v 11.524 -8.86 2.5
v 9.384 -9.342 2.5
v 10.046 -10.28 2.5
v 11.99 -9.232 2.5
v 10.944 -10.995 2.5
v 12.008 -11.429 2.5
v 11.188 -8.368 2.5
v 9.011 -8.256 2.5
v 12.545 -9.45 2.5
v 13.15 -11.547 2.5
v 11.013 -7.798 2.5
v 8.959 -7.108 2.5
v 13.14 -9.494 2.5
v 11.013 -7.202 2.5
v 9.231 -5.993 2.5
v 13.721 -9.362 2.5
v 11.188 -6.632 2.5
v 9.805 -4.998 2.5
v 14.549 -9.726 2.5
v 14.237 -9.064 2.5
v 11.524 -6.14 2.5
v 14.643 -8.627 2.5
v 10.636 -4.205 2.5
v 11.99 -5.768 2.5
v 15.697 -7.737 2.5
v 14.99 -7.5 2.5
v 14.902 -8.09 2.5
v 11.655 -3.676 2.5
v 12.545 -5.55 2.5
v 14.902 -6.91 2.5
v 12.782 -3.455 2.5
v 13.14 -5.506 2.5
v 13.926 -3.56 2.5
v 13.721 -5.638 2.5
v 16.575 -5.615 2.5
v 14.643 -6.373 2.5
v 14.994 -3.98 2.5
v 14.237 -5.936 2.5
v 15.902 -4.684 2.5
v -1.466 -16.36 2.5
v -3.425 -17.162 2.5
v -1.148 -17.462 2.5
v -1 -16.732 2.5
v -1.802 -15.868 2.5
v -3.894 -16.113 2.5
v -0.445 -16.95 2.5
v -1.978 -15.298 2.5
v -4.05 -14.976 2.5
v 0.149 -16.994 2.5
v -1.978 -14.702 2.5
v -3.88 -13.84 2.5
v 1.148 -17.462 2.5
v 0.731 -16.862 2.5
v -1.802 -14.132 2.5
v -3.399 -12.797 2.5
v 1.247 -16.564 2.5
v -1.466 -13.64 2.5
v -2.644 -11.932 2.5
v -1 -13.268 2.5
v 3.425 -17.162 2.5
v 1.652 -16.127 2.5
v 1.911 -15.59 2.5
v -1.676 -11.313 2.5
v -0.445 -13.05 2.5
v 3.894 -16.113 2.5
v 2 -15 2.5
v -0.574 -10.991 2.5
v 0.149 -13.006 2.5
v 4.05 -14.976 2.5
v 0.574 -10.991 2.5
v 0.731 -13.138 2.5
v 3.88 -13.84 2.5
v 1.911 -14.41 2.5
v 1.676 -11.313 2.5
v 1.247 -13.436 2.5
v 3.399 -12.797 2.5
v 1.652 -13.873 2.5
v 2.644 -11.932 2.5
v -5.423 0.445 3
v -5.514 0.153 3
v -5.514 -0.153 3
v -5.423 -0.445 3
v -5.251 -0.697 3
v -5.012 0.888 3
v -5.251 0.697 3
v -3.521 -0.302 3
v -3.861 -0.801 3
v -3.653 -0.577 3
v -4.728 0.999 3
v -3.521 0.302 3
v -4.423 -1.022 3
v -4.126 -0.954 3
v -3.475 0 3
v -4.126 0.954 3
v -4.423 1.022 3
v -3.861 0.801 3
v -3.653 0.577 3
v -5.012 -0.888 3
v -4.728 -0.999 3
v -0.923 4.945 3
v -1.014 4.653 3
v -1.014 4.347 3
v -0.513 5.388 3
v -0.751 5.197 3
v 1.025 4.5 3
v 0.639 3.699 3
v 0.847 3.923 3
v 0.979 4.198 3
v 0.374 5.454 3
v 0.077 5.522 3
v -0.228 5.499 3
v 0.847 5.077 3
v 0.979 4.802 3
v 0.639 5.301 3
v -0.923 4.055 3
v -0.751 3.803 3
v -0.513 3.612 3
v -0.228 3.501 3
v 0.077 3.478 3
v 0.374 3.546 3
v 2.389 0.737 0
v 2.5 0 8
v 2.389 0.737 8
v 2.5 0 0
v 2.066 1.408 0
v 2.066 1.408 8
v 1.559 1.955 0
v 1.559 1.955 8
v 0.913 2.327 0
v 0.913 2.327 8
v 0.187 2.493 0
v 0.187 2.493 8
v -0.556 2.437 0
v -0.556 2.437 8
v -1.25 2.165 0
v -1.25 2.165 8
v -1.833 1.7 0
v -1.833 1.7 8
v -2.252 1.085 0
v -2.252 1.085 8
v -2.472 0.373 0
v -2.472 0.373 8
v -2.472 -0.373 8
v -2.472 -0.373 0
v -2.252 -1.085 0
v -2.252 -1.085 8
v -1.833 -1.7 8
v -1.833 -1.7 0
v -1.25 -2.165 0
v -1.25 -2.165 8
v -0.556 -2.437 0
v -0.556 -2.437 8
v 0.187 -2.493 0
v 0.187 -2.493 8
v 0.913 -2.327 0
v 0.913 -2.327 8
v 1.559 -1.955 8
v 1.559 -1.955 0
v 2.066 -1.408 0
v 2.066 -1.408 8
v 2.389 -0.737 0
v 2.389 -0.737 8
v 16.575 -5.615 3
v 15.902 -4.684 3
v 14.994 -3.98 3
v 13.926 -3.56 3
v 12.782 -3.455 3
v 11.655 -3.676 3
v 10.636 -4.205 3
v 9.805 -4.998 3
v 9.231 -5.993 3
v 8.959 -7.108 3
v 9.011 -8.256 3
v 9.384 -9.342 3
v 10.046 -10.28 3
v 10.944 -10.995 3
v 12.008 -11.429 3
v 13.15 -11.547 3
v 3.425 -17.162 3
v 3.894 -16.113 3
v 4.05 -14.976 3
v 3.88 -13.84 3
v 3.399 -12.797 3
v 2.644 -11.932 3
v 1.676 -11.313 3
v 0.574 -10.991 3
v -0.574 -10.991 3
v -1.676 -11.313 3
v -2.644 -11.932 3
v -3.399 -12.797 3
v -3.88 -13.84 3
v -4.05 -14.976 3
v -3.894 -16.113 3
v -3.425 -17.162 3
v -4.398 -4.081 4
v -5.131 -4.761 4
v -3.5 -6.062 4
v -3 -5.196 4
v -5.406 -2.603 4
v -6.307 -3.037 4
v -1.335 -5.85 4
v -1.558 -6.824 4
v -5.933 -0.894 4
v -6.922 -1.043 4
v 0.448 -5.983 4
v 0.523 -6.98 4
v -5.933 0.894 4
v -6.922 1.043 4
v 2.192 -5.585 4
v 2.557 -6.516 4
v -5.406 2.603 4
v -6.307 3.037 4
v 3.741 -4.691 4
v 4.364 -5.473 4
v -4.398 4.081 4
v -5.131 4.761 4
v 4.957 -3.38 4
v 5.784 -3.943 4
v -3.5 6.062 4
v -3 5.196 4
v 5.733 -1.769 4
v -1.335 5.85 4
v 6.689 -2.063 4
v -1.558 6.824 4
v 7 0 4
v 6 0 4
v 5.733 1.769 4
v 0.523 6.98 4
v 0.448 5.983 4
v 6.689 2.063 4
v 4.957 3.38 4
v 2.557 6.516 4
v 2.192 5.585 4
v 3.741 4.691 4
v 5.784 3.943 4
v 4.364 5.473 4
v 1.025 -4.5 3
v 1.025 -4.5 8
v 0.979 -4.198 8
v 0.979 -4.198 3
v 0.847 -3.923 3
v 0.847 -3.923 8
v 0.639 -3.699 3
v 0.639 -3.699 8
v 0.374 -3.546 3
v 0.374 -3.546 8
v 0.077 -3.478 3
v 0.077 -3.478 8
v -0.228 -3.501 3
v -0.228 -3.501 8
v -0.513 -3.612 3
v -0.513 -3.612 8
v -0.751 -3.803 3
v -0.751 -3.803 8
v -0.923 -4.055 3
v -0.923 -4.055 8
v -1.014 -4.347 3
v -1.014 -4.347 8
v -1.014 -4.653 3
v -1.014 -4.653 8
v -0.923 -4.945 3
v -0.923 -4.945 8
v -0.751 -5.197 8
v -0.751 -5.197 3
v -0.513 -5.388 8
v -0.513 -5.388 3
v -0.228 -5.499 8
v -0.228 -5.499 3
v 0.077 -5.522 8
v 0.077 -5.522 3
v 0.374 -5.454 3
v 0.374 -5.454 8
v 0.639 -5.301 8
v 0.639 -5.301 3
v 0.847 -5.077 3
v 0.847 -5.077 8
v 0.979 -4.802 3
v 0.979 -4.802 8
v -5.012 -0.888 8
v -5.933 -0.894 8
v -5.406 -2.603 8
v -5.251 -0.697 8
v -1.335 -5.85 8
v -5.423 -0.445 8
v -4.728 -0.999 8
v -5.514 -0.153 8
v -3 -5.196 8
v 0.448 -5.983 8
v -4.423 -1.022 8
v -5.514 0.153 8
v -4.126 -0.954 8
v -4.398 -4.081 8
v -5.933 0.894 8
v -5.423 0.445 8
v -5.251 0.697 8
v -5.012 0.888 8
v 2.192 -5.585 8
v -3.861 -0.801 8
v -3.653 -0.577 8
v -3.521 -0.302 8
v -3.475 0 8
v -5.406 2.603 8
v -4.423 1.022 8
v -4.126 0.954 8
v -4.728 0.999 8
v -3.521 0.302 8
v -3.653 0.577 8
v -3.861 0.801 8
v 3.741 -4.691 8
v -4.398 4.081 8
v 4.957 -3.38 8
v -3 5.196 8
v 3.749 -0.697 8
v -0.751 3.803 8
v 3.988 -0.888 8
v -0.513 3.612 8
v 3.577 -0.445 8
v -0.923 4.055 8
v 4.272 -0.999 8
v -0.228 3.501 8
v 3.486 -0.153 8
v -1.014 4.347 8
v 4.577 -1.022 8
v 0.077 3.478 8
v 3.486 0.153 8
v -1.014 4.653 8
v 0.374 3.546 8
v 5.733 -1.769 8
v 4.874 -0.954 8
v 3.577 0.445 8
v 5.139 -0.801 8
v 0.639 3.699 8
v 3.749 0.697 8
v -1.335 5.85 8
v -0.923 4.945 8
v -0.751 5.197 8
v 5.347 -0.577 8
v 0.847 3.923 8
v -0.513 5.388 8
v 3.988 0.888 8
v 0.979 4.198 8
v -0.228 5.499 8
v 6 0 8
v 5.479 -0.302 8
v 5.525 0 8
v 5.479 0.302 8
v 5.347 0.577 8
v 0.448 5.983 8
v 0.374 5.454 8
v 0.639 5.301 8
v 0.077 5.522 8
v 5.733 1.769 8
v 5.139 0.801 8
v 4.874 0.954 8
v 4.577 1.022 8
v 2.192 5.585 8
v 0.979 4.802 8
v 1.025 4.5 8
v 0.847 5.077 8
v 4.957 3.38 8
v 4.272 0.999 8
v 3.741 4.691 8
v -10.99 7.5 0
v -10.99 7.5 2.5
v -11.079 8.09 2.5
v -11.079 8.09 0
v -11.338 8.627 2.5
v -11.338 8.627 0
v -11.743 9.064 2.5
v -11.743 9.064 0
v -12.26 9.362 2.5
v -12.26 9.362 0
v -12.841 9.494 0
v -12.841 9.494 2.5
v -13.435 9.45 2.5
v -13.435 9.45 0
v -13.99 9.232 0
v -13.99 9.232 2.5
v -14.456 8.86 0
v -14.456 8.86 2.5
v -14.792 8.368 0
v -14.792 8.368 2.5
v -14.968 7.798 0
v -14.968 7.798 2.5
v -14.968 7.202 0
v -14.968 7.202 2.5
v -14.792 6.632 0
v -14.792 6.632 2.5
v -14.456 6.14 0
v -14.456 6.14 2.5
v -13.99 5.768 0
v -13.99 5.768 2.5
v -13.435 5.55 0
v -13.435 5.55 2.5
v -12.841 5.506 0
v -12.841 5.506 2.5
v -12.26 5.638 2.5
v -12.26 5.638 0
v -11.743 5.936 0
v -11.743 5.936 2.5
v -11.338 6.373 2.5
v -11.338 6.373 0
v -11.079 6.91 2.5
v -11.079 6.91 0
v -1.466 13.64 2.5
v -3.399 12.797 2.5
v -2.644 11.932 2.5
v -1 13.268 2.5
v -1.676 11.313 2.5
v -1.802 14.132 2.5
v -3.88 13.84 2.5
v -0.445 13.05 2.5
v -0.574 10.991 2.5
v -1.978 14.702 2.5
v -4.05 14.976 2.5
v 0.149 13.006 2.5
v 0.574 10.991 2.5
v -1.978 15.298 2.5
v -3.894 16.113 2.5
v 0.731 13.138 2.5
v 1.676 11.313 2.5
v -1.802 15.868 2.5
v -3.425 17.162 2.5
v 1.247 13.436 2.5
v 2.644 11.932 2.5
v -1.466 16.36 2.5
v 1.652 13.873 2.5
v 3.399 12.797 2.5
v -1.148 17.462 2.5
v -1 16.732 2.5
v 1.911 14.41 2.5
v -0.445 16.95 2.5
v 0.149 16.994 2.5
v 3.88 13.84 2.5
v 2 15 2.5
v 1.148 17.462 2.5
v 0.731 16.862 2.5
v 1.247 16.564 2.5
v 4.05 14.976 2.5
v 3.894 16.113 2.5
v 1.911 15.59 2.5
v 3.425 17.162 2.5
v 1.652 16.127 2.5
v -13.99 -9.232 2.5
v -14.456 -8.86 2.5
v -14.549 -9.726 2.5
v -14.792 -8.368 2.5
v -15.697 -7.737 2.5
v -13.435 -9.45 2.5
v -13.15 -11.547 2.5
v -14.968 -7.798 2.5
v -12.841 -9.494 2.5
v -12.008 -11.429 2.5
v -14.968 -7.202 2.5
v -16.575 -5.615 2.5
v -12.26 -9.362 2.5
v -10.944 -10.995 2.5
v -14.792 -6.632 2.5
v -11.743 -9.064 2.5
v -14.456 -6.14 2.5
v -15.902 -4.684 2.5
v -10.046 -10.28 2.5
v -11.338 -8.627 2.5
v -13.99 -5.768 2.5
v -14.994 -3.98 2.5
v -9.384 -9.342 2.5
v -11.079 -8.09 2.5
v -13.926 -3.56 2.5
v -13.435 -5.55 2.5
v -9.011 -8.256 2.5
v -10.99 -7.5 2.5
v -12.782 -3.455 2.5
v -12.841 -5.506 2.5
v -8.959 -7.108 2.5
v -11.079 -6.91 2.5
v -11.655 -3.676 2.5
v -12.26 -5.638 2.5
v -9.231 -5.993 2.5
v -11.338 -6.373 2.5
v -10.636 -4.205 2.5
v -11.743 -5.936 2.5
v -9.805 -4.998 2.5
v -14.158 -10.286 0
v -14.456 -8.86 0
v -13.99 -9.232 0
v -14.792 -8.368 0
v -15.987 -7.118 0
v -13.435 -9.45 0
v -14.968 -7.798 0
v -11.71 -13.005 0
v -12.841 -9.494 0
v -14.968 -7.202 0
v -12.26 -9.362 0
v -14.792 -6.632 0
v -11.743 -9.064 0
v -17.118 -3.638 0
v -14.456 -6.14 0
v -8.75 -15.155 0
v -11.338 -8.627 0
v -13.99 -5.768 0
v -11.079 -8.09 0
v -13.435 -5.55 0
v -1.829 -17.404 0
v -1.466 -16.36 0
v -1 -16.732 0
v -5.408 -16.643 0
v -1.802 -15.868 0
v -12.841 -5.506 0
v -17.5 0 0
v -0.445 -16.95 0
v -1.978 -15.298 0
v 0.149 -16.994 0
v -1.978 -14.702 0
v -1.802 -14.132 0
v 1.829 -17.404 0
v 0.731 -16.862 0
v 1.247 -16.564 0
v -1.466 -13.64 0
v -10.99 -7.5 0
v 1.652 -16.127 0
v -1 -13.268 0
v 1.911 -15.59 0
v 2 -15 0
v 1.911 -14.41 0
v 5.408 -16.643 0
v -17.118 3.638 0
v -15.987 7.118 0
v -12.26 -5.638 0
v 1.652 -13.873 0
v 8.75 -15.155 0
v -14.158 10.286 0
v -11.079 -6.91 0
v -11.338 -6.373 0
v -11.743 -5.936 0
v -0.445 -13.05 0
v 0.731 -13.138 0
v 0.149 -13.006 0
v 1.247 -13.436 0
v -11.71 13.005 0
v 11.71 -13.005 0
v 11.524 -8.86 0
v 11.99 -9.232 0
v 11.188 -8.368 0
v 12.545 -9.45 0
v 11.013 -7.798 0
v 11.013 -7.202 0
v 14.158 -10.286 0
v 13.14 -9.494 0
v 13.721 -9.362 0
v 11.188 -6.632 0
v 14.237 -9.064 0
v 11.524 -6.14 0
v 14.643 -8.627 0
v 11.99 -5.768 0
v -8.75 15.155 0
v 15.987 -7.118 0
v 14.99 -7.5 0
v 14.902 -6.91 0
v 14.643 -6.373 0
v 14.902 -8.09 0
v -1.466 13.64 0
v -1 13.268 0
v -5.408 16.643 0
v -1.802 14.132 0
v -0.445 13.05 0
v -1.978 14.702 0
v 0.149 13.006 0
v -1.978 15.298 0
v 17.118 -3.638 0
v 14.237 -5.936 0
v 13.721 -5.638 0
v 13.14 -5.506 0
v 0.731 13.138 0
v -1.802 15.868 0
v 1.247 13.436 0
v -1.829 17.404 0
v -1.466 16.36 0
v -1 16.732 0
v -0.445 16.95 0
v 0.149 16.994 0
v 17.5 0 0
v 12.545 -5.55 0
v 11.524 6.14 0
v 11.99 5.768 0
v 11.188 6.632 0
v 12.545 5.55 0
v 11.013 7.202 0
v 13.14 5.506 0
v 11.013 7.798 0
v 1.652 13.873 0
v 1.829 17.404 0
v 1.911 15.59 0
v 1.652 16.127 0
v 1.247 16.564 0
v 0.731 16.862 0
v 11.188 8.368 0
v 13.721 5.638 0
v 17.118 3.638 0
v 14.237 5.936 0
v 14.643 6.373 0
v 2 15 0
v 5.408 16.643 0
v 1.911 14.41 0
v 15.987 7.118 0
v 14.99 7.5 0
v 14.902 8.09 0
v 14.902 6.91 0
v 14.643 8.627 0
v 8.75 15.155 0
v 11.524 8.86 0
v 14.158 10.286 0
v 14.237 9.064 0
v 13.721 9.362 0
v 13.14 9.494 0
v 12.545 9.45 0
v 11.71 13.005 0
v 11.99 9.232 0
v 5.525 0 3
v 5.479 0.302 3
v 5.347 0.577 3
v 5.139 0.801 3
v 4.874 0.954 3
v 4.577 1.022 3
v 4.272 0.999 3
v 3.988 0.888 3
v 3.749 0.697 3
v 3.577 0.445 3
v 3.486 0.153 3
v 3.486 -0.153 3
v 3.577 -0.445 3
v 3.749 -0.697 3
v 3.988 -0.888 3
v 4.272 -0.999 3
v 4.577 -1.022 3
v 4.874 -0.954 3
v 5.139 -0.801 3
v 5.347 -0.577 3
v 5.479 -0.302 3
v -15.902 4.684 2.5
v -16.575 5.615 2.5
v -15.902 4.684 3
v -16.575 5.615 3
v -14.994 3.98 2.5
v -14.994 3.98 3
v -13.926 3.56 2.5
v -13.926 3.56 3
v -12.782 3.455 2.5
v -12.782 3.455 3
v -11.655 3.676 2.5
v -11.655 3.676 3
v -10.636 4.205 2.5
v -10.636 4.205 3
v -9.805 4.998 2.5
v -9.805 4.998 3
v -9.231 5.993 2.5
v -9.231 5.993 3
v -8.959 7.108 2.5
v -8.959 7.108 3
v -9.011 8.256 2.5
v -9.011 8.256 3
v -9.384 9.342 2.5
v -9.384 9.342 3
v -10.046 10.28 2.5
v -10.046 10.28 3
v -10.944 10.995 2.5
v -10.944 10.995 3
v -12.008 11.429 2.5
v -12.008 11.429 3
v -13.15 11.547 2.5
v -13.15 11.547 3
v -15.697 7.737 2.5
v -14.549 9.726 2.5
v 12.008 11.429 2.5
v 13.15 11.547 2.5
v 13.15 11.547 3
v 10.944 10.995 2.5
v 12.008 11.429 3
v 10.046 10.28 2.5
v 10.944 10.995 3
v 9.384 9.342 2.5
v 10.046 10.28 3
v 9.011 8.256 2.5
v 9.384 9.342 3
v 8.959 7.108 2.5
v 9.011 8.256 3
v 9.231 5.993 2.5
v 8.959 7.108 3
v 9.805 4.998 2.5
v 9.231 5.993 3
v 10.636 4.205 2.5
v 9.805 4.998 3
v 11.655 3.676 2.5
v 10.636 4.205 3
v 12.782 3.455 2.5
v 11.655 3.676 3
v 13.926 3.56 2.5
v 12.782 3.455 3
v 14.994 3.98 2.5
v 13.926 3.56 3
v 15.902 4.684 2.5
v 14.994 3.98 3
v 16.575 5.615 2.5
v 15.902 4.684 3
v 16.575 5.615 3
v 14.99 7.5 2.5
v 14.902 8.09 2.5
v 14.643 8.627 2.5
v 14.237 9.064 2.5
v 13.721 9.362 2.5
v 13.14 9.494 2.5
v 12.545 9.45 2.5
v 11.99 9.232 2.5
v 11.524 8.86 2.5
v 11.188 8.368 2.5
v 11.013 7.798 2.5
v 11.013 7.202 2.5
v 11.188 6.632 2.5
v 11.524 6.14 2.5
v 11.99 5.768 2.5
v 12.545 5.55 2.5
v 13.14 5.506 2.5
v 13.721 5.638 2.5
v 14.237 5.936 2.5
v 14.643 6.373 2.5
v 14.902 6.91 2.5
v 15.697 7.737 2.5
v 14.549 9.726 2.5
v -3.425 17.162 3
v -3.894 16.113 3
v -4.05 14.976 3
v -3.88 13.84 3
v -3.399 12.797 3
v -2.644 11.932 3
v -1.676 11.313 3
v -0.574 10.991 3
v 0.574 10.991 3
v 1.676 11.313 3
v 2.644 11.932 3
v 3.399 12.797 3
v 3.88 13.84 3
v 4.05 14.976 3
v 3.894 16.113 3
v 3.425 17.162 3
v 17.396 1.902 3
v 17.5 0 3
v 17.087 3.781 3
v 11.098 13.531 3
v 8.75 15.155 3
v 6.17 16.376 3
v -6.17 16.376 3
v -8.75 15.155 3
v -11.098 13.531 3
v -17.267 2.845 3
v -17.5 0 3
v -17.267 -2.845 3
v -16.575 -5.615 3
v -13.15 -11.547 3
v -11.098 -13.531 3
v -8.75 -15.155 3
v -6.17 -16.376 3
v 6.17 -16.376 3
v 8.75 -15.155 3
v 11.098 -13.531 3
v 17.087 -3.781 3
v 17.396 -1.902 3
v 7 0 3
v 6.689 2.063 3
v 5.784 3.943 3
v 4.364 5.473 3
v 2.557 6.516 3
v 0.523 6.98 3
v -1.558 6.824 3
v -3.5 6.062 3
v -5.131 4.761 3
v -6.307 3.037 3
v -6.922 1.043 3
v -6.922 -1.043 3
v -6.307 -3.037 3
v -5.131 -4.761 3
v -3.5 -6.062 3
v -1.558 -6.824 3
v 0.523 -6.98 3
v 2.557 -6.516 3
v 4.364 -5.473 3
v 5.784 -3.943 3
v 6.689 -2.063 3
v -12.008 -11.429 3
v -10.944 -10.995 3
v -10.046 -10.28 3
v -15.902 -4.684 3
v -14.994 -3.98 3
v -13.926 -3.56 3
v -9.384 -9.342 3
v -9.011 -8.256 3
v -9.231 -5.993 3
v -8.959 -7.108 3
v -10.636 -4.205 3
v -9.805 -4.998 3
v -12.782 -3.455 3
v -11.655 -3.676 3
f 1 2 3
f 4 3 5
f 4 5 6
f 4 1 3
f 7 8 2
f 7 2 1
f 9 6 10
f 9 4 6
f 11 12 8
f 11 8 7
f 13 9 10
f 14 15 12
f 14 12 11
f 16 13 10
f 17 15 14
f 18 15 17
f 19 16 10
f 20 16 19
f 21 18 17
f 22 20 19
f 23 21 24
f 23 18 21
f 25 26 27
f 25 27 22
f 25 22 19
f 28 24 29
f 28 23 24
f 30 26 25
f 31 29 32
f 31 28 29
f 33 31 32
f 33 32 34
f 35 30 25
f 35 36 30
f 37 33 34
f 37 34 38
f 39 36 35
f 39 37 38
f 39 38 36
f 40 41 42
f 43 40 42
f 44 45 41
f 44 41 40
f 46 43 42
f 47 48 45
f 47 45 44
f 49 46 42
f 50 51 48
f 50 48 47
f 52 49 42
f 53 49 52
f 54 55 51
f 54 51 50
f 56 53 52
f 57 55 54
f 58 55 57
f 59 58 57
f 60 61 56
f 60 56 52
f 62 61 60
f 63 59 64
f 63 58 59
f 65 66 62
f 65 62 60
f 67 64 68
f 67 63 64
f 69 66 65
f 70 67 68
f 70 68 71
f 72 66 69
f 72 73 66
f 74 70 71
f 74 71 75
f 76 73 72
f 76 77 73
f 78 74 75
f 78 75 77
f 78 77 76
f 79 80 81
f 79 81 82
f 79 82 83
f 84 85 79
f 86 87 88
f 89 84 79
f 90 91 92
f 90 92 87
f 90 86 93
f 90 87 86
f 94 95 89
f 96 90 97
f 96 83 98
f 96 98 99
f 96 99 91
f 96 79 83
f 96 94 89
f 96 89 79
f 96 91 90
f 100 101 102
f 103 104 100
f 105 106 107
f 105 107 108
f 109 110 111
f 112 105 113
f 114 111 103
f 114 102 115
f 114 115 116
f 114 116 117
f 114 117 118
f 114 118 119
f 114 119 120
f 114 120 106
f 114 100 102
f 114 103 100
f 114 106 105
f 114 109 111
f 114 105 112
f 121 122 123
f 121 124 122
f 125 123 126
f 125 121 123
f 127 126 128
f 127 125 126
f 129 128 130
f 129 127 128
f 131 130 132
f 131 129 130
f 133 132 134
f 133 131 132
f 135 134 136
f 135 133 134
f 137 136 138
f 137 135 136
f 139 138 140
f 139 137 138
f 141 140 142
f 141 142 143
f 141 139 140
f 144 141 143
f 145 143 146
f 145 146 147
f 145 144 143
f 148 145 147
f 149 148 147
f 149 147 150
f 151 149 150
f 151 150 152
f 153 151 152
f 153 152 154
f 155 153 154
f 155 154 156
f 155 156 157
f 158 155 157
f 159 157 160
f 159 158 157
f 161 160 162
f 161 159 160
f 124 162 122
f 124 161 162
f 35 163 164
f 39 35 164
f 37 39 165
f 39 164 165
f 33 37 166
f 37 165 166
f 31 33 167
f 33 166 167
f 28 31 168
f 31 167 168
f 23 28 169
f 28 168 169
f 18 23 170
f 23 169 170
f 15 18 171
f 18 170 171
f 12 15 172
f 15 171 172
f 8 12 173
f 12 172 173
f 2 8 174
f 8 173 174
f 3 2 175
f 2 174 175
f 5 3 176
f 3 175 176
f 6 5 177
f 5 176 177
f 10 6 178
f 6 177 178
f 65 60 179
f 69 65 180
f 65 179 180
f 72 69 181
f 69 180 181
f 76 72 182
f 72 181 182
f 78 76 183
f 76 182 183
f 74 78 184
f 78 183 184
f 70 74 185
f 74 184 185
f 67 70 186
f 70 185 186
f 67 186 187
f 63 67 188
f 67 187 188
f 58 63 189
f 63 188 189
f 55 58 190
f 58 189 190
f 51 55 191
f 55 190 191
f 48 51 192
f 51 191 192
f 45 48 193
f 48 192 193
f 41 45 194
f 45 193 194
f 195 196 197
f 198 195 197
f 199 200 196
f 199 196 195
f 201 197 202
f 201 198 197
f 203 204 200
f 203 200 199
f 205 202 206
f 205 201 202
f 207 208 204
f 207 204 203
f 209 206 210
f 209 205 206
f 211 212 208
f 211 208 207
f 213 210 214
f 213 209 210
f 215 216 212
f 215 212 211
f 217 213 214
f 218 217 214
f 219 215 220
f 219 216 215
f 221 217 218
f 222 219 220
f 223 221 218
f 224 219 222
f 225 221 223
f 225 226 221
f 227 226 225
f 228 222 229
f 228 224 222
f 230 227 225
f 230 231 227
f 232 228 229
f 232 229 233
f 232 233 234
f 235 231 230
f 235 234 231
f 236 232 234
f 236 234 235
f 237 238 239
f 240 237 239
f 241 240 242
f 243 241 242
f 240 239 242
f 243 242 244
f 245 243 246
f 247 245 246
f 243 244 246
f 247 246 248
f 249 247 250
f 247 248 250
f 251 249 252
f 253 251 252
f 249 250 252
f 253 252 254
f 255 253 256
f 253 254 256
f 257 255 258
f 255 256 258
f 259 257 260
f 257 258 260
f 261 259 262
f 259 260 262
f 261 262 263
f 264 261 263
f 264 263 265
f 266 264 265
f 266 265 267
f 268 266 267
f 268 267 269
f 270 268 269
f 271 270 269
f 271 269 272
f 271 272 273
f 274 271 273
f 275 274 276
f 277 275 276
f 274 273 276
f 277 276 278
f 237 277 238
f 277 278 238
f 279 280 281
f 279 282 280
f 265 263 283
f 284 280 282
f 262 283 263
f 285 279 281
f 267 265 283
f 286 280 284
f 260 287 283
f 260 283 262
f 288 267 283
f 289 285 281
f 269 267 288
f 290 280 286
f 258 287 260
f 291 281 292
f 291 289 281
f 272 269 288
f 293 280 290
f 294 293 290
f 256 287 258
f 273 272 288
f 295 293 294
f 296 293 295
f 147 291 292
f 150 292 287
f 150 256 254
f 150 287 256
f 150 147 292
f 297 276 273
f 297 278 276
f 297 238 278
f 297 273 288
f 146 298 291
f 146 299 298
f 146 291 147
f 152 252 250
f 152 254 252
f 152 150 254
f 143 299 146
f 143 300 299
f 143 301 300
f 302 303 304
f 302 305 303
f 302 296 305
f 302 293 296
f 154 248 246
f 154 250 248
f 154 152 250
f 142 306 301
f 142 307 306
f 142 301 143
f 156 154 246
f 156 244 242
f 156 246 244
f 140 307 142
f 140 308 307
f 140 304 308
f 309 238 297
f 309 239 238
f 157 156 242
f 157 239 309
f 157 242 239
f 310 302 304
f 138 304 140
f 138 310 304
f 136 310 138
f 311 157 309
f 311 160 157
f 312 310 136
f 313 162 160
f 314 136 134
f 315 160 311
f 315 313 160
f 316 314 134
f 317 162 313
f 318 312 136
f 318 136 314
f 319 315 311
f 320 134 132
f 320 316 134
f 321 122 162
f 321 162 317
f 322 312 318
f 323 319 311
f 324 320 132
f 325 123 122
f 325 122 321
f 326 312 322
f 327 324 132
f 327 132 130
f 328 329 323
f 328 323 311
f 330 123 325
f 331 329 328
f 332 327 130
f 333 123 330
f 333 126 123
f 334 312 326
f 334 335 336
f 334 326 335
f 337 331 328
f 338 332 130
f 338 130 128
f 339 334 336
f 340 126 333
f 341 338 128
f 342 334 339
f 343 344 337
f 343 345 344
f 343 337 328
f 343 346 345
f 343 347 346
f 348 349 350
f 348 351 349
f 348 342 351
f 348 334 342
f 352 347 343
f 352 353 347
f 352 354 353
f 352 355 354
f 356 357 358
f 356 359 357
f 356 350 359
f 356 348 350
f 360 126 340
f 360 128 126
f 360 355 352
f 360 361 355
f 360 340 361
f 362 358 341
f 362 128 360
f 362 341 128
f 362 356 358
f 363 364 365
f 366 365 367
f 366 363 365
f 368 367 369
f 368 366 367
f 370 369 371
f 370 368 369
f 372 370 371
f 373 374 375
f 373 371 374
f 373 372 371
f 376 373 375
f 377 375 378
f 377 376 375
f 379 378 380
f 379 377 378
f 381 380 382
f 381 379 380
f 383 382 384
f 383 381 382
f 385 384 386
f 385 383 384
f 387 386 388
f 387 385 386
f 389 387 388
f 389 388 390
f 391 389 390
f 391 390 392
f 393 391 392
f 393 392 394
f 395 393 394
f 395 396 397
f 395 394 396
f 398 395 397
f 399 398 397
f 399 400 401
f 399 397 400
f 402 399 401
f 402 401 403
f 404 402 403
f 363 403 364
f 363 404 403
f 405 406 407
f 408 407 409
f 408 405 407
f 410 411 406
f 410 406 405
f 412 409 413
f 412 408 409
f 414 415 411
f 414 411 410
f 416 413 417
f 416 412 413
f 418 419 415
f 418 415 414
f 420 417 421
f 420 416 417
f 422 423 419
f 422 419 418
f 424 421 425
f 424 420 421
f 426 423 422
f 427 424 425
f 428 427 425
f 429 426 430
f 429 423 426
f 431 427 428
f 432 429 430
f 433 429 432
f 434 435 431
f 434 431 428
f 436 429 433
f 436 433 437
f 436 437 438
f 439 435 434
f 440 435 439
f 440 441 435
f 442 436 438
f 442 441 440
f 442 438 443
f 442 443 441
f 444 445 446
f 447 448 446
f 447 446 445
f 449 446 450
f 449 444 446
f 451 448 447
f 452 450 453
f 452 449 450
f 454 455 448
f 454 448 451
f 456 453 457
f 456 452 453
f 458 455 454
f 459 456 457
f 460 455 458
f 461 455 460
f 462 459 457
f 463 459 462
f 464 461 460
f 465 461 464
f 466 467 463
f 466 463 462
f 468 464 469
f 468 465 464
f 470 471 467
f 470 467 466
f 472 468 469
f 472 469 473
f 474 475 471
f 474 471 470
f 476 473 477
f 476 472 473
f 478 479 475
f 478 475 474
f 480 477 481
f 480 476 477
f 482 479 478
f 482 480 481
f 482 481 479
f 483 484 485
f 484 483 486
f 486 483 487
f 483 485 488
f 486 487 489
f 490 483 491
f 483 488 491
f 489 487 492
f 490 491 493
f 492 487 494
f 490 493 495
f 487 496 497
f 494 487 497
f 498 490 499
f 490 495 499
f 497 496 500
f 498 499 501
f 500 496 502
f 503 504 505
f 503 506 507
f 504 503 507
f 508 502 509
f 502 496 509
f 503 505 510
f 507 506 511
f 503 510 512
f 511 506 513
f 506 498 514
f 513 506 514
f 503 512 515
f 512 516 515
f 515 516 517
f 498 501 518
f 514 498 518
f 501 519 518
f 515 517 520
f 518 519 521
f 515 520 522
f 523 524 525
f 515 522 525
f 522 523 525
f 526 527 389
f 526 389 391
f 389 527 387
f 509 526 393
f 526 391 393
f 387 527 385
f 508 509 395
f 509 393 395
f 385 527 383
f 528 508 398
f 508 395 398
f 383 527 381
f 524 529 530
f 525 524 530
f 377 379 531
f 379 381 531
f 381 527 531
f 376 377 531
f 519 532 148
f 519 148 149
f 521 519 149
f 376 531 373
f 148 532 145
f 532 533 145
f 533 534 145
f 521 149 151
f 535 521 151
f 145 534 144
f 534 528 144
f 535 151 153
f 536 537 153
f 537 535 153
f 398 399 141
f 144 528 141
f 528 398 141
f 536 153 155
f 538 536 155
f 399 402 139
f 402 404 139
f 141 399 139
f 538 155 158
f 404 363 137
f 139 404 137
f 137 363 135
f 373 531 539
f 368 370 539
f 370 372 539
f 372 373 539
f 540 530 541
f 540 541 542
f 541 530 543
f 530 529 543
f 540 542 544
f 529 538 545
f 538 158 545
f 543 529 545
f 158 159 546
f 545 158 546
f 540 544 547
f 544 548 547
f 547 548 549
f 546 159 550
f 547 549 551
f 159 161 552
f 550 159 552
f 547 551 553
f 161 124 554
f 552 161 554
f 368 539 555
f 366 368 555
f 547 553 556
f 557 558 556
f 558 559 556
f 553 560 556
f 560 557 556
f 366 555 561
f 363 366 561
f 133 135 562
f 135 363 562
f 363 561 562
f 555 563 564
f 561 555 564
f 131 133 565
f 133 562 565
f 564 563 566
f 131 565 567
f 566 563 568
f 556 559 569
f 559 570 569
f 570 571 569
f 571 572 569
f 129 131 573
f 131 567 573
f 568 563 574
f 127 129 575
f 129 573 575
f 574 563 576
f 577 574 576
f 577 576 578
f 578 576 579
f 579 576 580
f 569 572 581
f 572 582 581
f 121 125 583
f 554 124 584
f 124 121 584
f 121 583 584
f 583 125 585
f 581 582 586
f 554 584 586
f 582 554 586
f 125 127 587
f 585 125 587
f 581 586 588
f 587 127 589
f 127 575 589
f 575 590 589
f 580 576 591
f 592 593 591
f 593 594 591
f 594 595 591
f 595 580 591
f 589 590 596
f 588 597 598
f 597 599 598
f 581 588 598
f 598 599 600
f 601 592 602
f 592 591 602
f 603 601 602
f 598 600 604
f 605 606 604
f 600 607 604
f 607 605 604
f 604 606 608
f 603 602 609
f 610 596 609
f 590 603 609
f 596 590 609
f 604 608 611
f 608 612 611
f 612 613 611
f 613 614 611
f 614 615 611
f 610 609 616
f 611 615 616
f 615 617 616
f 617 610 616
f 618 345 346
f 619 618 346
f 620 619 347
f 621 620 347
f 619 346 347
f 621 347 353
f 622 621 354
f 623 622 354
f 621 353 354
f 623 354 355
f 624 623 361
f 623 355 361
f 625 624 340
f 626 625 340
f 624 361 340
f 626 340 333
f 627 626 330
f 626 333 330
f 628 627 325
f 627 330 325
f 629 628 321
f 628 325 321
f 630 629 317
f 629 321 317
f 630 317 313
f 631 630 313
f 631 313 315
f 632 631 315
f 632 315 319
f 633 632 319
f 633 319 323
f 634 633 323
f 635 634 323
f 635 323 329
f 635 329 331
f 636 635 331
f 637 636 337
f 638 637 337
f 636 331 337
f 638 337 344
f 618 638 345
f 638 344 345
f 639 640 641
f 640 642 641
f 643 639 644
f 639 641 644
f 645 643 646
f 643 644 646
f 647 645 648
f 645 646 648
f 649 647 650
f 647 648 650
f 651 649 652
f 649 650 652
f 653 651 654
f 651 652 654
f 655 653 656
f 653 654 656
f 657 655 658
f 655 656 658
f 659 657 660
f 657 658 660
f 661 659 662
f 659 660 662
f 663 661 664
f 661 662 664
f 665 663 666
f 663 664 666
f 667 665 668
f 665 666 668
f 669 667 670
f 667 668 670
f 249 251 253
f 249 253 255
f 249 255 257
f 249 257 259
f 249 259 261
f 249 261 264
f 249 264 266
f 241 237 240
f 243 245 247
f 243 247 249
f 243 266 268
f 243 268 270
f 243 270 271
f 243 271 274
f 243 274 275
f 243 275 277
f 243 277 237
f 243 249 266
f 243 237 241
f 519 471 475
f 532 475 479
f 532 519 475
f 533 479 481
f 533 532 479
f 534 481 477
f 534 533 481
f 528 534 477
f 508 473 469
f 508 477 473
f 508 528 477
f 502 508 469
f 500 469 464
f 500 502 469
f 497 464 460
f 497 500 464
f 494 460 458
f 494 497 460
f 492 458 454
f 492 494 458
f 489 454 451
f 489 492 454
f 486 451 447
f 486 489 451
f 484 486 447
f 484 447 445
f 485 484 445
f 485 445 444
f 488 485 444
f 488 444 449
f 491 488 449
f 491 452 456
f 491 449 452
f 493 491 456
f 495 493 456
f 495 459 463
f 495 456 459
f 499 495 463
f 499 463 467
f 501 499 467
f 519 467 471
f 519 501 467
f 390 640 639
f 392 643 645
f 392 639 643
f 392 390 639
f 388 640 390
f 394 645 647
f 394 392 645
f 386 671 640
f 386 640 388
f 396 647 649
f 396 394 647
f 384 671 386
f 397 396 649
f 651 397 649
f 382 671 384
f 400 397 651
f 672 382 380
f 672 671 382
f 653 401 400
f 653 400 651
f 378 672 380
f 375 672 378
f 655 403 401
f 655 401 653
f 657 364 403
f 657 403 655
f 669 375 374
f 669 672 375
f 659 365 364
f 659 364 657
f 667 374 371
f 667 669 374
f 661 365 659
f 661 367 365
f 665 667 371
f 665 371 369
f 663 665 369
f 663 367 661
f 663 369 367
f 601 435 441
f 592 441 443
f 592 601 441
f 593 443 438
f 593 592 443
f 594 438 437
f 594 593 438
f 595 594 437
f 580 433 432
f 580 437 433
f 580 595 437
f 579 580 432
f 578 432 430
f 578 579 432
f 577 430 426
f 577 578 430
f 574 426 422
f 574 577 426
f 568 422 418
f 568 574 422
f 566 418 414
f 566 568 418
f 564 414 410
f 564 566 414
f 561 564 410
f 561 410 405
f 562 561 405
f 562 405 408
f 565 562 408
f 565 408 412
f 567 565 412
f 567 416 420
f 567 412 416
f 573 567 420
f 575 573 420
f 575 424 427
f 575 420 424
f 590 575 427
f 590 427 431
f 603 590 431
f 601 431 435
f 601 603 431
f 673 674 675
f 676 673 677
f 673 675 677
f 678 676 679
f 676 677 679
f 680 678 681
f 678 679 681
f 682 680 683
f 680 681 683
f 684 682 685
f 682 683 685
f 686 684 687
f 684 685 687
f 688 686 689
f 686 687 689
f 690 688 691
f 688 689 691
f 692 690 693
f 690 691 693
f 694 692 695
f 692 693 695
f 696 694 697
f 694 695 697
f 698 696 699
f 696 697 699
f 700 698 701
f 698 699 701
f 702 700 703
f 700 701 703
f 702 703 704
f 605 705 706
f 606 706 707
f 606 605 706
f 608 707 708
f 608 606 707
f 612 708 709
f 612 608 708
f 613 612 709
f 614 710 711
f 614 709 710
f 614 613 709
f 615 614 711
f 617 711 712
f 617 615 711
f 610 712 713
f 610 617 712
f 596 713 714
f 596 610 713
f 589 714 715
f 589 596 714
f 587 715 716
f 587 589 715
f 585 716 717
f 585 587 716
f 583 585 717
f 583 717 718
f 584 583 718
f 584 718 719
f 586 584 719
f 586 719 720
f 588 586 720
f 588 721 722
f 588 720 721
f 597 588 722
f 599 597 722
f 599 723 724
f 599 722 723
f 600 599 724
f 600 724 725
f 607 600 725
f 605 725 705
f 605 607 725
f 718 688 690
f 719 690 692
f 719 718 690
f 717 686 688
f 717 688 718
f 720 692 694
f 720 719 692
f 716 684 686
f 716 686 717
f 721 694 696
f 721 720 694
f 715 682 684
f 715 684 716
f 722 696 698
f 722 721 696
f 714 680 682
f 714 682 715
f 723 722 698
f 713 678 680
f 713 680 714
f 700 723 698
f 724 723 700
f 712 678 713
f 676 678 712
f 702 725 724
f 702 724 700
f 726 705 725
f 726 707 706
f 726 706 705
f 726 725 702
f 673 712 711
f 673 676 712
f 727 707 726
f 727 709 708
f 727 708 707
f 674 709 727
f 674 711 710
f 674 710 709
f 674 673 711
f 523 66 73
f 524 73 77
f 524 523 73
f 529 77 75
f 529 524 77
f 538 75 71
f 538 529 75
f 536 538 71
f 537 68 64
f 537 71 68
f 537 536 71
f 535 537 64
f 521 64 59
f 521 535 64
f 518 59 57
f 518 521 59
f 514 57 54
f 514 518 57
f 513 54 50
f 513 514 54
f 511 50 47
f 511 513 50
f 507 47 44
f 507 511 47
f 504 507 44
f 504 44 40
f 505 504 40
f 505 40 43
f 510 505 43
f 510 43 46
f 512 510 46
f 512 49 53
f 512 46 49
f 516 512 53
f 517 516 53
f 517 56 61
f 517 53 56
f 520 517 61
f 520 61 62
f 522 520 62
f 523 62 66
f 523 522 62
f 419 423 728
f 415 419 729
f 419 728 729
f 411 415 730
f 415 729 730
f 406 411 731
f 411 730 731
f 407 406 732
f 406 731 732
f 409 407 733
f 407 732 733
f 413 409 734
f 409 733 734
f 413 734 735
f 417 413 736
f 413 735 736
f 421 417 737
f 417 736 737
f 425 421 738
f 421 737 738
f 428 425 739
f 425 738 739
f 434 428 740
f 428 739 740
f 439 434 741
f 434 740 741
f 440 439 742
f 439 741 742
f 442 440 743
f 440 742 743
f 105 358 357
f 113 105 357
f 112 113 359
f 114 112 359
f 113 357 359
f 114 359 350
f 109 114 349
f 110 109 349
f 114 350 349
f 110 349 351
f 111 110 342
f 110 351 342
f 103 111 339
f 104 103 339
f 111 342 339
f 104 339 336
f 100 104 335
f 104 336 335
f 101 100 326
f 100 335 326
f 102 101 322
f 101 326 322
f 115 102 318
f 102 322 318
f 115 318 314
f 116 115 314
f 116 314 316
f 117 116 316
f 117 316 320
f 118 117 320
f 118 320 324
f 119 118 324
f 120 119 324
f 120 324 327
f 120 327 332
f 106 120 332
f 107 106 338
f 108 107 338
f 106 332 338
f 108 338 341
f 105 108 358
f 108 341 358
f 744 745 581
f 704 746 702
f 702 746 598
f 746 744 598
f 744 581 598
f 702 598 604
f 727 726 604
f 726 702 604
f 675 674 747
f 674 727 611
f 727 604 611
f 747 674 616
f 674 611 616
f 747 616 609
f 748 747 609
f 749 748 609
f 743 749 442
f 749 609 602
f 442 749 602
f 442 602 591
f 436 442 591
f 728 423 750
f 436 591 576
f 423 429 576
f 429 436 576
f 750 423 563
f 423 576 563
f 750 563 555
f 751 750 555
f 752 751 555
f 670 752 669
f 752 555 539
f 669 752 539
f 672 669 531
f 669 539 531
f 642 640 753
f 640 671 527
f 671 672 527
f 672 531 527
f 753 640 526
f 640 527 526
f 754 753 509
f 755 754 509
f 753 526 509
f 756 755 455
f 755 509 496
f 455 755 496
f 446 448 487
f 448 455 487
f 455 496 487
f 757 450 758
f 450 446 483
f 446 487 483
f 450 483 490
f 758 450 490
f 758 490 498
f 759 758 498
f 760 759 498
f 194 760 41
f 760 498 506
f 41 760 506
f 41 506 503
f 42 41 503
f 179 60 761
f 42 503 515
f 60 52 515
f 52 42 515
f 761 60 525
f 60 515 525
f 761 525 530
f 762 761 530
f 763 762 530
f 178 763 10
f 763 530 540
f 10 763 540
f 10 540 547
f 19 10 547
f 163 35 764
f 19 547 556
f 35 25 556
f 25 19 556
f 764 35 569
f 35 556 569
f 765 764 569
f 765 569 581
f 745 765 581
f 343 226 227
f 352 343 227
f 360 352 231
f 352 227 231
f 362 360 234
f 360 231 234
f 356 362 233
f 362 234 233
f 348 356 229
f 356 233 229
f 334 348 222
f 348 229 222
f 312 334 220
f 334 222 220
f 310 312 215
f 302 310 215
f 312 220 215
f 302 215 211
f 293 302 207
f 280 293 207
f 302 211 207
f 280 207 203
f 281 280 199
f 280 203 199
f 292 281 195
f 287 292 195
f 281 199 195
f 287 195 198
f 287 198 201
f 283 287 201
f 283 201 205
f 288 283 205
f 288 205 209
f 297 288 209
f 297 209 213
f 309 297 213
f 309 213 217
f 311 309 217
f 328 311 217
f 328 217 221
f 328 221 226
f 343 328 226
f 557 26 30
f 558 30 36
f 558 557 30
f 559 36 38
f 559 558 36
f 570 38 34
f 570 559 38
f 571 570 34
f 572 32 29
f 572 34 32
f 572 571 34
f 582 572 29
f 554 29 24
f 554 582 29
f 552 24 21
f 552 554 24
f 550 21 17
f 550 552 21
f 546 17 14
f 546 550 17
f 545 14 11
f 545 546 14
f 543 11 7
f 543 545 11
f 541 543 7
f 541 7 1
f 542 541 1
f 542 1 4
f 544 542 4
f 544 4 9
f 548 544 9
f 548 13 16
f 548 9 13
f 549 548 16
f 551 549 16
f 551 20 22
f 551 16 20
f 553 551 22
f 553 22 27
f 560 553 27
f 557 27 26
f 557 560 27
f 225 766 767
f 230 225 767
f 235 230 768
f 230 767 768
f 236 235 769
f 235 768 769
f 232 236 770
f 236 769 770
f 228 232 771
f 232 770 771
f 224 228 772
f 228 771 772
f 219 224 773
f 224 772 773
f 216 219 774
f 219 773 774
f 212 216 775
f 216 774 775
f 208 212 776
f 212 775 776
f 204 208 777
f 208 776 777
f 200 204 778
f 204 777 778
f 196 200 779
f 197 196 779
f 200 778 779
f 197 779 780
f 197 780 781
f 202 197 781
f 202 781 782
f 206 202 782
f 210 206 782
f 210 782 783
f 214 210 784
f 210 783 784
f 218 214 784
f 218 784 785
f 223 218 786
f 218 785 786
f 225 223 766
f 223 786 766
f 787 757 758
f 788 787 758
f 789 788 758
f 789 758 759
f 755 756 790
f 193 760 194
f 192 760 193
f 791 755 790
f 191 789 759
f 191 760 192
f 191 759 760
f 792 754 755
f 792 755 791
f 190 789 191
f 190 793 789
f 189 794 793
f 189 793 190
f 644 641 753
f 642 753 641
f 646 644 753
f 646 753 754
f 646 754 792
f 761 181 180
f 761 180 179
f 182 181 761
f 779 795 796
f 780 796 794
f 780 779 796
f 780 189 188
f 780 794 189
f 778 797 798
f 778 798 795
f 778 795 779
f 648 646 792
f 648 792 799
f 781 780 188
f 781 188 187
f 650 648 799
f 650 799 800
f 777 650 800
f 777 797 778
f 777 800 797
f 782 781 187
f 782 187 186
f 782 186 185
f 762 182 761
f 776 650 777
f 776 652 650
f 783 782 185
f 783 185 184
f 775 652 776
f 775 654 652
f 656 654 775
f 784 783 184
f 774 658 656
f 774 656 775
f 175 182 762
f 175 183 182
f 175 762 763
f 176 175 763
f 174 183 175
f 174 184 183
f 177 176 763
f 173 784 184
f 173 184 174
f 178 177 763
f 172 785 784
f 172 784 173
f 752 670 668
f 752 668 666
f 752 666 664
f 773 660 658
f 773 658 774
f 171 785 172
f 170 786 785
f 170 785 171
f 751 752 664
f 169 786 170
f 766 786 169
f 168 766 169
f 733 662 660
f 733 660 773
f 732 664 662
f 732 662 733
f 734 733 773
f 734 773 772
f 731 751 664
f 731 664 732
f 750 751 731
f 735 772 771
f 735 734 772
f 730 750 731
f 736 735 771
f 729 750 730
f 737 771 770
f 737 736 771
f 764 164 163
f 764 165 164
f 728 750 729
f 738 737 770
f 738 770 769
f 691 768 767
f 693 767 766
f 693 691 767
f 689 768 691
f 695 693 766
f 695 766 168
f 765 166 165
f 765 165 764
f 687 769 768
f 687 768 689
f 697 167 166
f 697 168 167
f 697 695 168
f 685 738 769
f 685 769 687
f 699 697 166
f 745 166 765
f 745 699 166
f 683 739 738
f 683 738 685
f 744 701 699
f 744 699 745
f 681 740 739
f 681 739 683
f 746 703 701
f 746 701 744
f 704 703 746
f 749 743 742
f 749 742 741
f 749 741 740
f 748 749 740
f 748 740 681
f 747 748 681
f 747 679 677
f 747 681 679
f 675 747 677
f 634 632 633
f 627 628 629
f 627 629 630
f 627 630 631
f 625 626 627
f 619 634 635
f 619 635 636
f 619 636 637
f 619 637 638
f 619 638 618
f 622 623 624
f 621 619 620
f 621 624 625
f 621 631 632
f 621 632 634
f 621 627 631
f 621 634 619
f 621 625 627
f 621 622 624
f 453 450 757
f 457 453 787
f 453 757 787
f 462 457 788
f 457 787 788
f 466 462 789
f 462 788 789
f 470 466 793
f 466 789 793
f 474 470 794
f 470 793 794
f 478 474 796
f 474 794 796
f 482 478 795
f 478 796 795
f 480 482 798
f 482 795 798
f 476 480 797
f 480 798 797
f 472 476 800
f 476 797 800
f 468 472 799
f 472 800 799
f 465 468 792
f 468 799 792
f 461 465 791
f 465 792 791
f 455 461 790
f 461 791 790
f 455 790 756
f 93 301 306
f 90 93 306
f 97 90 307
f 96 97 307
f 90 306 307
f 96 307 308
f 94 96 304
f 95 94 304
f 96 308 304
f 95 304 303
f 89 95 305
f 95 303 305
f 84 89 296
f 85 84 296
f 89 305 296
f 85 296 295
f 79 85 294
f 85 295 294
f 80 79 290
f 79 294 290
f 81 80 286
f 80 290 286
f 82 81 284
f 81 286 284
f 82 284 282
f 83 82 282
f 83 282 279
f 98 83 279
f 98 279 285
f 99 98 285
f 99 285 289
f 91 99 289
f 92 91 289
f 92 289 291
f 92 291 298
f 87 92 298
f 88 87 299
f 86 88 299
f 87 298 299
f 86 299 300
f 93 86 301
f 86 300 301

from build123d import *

# Parameters (mm, degrees)
SKETCH_1_R          = 17.5
SKETCH_1_R_2        = 2.5
SKETCH_1_R_3        = 2
EXTRUDE_1_DEPTH     = 3
SKETCH_2_R          = 6
SKETCH_2_R_2        = 2.5
EXTRUDE_2_DEPTH     = 5
SKETCH_4_R          = 4.05
CUT_EXTRUDE_2_DEPTH = 0.5
SKETCH_5_R          = 1.025
CUT_EXTRUDE_3_DEPTH = 5
SKETCH_6_R          = 7
SKETCH_6_R_2        = 5.979713823
EXTRUDE_4_DEPTH     = 1


with BuildPart() as part:
    # 草图1 → 凸台-拉伸1 (new body)
    with BuildSketch(Plane.XY):
        Circle(SKETCH_1_R)
        Circle(SKETCH_1_R_2, mode=Mode.SUBTRACT)
        with Locations((0, 15)):
            Circle(SKETCH_1_R_3, mode=Mode.SUBTRACT)
        with Locations((12.990381057, 7.5)):
            Circle(SKETCH_1_R_3, mode=Mode.SUBTRACT)
        with Locations((12.990381057, -7.5)):
            Circle(SKETCH_1_R_3, mode=Mode.SUBTRACT)
        with Locations((0, -15)):
            Circle(SKETCH_1_R_3, mode=Mode.SUBTRACT)
        with Locations((-12.990381057, -7.5)):
            Circle(SKETCH_1_R_3, mode=Mode.SUBTRACT)
        with Locations((-12.990381057, 7.5)):
            Circle(SKETCH_1_R_3, mode=Mode.SUBTRACT)
    extrude(amount=EXTRUDE_1_DEPTH)

    # 草图2 → 凸台-拉伸2 (add)
    with BuildSketch(Plane.XY.offset(3)):
        Circle(SKETCH_2_R)
        Circle(SKETCH_2_R_2, mode=Mode.SUBTRACT)
    extrude(amount=EXTRUDE_2_DEPTH)

    # 草图4 → 切除-拉伸2 (cut)
    with BuildSketch(Plane.XY.offset(3)):
        with Locations((12.990381057, 7.5)):
            Circle(SKETCH_4_R)
        with Locations((12.990381057, -7.5)):
            Circle(SKETCH_4_R)
        with Locations((0, -15)):
            Circle(SKETCH_4_R)
        with Locations((-12.990381057, -7.5)):
            Circle(SKETCH_4_R)
        with Locations((-12.990381057, 7.5)):
            Circle(SKETCH_4_R)
        with Locations((0, 15)):
            Circle(SKETCH_4_R)
    extrude(amount=-CUT_EXTRUDE_2_DEPTH, mode=Mode.SUBTRACT)

    # 草图5 → 切除-拉伸3 (cut)
    with BuildSketch(Plane.XY.offset(8)):
        with Locations((0, 4.5)):
            Circle(SKETCH_5_R)
        with Locations((4.5, 0)):
            Circle(SKETCH_5_R)
        with Locations((0, -4.5)):
            Circle(SKETCH_5_R)
        with Locations((-4.5, 0)):
            Circle(SKETCH_5_R)
    extrude(amount=-CUT_EXTRUDE_3_DEPTH, mode=Mode.SUBTRACT)

    # 草图6 → 凸台-拉伸4 (add)
    with BuildSketch(Plane.XY.offset(3)):
        Circle(SKETCH_6_R)
        Circle(SKETCH_6_R_2, mode=Mode.SUBTRACT)
    extrude(amount=EXTRUDE_4_DEPTH)


solid = part.part
